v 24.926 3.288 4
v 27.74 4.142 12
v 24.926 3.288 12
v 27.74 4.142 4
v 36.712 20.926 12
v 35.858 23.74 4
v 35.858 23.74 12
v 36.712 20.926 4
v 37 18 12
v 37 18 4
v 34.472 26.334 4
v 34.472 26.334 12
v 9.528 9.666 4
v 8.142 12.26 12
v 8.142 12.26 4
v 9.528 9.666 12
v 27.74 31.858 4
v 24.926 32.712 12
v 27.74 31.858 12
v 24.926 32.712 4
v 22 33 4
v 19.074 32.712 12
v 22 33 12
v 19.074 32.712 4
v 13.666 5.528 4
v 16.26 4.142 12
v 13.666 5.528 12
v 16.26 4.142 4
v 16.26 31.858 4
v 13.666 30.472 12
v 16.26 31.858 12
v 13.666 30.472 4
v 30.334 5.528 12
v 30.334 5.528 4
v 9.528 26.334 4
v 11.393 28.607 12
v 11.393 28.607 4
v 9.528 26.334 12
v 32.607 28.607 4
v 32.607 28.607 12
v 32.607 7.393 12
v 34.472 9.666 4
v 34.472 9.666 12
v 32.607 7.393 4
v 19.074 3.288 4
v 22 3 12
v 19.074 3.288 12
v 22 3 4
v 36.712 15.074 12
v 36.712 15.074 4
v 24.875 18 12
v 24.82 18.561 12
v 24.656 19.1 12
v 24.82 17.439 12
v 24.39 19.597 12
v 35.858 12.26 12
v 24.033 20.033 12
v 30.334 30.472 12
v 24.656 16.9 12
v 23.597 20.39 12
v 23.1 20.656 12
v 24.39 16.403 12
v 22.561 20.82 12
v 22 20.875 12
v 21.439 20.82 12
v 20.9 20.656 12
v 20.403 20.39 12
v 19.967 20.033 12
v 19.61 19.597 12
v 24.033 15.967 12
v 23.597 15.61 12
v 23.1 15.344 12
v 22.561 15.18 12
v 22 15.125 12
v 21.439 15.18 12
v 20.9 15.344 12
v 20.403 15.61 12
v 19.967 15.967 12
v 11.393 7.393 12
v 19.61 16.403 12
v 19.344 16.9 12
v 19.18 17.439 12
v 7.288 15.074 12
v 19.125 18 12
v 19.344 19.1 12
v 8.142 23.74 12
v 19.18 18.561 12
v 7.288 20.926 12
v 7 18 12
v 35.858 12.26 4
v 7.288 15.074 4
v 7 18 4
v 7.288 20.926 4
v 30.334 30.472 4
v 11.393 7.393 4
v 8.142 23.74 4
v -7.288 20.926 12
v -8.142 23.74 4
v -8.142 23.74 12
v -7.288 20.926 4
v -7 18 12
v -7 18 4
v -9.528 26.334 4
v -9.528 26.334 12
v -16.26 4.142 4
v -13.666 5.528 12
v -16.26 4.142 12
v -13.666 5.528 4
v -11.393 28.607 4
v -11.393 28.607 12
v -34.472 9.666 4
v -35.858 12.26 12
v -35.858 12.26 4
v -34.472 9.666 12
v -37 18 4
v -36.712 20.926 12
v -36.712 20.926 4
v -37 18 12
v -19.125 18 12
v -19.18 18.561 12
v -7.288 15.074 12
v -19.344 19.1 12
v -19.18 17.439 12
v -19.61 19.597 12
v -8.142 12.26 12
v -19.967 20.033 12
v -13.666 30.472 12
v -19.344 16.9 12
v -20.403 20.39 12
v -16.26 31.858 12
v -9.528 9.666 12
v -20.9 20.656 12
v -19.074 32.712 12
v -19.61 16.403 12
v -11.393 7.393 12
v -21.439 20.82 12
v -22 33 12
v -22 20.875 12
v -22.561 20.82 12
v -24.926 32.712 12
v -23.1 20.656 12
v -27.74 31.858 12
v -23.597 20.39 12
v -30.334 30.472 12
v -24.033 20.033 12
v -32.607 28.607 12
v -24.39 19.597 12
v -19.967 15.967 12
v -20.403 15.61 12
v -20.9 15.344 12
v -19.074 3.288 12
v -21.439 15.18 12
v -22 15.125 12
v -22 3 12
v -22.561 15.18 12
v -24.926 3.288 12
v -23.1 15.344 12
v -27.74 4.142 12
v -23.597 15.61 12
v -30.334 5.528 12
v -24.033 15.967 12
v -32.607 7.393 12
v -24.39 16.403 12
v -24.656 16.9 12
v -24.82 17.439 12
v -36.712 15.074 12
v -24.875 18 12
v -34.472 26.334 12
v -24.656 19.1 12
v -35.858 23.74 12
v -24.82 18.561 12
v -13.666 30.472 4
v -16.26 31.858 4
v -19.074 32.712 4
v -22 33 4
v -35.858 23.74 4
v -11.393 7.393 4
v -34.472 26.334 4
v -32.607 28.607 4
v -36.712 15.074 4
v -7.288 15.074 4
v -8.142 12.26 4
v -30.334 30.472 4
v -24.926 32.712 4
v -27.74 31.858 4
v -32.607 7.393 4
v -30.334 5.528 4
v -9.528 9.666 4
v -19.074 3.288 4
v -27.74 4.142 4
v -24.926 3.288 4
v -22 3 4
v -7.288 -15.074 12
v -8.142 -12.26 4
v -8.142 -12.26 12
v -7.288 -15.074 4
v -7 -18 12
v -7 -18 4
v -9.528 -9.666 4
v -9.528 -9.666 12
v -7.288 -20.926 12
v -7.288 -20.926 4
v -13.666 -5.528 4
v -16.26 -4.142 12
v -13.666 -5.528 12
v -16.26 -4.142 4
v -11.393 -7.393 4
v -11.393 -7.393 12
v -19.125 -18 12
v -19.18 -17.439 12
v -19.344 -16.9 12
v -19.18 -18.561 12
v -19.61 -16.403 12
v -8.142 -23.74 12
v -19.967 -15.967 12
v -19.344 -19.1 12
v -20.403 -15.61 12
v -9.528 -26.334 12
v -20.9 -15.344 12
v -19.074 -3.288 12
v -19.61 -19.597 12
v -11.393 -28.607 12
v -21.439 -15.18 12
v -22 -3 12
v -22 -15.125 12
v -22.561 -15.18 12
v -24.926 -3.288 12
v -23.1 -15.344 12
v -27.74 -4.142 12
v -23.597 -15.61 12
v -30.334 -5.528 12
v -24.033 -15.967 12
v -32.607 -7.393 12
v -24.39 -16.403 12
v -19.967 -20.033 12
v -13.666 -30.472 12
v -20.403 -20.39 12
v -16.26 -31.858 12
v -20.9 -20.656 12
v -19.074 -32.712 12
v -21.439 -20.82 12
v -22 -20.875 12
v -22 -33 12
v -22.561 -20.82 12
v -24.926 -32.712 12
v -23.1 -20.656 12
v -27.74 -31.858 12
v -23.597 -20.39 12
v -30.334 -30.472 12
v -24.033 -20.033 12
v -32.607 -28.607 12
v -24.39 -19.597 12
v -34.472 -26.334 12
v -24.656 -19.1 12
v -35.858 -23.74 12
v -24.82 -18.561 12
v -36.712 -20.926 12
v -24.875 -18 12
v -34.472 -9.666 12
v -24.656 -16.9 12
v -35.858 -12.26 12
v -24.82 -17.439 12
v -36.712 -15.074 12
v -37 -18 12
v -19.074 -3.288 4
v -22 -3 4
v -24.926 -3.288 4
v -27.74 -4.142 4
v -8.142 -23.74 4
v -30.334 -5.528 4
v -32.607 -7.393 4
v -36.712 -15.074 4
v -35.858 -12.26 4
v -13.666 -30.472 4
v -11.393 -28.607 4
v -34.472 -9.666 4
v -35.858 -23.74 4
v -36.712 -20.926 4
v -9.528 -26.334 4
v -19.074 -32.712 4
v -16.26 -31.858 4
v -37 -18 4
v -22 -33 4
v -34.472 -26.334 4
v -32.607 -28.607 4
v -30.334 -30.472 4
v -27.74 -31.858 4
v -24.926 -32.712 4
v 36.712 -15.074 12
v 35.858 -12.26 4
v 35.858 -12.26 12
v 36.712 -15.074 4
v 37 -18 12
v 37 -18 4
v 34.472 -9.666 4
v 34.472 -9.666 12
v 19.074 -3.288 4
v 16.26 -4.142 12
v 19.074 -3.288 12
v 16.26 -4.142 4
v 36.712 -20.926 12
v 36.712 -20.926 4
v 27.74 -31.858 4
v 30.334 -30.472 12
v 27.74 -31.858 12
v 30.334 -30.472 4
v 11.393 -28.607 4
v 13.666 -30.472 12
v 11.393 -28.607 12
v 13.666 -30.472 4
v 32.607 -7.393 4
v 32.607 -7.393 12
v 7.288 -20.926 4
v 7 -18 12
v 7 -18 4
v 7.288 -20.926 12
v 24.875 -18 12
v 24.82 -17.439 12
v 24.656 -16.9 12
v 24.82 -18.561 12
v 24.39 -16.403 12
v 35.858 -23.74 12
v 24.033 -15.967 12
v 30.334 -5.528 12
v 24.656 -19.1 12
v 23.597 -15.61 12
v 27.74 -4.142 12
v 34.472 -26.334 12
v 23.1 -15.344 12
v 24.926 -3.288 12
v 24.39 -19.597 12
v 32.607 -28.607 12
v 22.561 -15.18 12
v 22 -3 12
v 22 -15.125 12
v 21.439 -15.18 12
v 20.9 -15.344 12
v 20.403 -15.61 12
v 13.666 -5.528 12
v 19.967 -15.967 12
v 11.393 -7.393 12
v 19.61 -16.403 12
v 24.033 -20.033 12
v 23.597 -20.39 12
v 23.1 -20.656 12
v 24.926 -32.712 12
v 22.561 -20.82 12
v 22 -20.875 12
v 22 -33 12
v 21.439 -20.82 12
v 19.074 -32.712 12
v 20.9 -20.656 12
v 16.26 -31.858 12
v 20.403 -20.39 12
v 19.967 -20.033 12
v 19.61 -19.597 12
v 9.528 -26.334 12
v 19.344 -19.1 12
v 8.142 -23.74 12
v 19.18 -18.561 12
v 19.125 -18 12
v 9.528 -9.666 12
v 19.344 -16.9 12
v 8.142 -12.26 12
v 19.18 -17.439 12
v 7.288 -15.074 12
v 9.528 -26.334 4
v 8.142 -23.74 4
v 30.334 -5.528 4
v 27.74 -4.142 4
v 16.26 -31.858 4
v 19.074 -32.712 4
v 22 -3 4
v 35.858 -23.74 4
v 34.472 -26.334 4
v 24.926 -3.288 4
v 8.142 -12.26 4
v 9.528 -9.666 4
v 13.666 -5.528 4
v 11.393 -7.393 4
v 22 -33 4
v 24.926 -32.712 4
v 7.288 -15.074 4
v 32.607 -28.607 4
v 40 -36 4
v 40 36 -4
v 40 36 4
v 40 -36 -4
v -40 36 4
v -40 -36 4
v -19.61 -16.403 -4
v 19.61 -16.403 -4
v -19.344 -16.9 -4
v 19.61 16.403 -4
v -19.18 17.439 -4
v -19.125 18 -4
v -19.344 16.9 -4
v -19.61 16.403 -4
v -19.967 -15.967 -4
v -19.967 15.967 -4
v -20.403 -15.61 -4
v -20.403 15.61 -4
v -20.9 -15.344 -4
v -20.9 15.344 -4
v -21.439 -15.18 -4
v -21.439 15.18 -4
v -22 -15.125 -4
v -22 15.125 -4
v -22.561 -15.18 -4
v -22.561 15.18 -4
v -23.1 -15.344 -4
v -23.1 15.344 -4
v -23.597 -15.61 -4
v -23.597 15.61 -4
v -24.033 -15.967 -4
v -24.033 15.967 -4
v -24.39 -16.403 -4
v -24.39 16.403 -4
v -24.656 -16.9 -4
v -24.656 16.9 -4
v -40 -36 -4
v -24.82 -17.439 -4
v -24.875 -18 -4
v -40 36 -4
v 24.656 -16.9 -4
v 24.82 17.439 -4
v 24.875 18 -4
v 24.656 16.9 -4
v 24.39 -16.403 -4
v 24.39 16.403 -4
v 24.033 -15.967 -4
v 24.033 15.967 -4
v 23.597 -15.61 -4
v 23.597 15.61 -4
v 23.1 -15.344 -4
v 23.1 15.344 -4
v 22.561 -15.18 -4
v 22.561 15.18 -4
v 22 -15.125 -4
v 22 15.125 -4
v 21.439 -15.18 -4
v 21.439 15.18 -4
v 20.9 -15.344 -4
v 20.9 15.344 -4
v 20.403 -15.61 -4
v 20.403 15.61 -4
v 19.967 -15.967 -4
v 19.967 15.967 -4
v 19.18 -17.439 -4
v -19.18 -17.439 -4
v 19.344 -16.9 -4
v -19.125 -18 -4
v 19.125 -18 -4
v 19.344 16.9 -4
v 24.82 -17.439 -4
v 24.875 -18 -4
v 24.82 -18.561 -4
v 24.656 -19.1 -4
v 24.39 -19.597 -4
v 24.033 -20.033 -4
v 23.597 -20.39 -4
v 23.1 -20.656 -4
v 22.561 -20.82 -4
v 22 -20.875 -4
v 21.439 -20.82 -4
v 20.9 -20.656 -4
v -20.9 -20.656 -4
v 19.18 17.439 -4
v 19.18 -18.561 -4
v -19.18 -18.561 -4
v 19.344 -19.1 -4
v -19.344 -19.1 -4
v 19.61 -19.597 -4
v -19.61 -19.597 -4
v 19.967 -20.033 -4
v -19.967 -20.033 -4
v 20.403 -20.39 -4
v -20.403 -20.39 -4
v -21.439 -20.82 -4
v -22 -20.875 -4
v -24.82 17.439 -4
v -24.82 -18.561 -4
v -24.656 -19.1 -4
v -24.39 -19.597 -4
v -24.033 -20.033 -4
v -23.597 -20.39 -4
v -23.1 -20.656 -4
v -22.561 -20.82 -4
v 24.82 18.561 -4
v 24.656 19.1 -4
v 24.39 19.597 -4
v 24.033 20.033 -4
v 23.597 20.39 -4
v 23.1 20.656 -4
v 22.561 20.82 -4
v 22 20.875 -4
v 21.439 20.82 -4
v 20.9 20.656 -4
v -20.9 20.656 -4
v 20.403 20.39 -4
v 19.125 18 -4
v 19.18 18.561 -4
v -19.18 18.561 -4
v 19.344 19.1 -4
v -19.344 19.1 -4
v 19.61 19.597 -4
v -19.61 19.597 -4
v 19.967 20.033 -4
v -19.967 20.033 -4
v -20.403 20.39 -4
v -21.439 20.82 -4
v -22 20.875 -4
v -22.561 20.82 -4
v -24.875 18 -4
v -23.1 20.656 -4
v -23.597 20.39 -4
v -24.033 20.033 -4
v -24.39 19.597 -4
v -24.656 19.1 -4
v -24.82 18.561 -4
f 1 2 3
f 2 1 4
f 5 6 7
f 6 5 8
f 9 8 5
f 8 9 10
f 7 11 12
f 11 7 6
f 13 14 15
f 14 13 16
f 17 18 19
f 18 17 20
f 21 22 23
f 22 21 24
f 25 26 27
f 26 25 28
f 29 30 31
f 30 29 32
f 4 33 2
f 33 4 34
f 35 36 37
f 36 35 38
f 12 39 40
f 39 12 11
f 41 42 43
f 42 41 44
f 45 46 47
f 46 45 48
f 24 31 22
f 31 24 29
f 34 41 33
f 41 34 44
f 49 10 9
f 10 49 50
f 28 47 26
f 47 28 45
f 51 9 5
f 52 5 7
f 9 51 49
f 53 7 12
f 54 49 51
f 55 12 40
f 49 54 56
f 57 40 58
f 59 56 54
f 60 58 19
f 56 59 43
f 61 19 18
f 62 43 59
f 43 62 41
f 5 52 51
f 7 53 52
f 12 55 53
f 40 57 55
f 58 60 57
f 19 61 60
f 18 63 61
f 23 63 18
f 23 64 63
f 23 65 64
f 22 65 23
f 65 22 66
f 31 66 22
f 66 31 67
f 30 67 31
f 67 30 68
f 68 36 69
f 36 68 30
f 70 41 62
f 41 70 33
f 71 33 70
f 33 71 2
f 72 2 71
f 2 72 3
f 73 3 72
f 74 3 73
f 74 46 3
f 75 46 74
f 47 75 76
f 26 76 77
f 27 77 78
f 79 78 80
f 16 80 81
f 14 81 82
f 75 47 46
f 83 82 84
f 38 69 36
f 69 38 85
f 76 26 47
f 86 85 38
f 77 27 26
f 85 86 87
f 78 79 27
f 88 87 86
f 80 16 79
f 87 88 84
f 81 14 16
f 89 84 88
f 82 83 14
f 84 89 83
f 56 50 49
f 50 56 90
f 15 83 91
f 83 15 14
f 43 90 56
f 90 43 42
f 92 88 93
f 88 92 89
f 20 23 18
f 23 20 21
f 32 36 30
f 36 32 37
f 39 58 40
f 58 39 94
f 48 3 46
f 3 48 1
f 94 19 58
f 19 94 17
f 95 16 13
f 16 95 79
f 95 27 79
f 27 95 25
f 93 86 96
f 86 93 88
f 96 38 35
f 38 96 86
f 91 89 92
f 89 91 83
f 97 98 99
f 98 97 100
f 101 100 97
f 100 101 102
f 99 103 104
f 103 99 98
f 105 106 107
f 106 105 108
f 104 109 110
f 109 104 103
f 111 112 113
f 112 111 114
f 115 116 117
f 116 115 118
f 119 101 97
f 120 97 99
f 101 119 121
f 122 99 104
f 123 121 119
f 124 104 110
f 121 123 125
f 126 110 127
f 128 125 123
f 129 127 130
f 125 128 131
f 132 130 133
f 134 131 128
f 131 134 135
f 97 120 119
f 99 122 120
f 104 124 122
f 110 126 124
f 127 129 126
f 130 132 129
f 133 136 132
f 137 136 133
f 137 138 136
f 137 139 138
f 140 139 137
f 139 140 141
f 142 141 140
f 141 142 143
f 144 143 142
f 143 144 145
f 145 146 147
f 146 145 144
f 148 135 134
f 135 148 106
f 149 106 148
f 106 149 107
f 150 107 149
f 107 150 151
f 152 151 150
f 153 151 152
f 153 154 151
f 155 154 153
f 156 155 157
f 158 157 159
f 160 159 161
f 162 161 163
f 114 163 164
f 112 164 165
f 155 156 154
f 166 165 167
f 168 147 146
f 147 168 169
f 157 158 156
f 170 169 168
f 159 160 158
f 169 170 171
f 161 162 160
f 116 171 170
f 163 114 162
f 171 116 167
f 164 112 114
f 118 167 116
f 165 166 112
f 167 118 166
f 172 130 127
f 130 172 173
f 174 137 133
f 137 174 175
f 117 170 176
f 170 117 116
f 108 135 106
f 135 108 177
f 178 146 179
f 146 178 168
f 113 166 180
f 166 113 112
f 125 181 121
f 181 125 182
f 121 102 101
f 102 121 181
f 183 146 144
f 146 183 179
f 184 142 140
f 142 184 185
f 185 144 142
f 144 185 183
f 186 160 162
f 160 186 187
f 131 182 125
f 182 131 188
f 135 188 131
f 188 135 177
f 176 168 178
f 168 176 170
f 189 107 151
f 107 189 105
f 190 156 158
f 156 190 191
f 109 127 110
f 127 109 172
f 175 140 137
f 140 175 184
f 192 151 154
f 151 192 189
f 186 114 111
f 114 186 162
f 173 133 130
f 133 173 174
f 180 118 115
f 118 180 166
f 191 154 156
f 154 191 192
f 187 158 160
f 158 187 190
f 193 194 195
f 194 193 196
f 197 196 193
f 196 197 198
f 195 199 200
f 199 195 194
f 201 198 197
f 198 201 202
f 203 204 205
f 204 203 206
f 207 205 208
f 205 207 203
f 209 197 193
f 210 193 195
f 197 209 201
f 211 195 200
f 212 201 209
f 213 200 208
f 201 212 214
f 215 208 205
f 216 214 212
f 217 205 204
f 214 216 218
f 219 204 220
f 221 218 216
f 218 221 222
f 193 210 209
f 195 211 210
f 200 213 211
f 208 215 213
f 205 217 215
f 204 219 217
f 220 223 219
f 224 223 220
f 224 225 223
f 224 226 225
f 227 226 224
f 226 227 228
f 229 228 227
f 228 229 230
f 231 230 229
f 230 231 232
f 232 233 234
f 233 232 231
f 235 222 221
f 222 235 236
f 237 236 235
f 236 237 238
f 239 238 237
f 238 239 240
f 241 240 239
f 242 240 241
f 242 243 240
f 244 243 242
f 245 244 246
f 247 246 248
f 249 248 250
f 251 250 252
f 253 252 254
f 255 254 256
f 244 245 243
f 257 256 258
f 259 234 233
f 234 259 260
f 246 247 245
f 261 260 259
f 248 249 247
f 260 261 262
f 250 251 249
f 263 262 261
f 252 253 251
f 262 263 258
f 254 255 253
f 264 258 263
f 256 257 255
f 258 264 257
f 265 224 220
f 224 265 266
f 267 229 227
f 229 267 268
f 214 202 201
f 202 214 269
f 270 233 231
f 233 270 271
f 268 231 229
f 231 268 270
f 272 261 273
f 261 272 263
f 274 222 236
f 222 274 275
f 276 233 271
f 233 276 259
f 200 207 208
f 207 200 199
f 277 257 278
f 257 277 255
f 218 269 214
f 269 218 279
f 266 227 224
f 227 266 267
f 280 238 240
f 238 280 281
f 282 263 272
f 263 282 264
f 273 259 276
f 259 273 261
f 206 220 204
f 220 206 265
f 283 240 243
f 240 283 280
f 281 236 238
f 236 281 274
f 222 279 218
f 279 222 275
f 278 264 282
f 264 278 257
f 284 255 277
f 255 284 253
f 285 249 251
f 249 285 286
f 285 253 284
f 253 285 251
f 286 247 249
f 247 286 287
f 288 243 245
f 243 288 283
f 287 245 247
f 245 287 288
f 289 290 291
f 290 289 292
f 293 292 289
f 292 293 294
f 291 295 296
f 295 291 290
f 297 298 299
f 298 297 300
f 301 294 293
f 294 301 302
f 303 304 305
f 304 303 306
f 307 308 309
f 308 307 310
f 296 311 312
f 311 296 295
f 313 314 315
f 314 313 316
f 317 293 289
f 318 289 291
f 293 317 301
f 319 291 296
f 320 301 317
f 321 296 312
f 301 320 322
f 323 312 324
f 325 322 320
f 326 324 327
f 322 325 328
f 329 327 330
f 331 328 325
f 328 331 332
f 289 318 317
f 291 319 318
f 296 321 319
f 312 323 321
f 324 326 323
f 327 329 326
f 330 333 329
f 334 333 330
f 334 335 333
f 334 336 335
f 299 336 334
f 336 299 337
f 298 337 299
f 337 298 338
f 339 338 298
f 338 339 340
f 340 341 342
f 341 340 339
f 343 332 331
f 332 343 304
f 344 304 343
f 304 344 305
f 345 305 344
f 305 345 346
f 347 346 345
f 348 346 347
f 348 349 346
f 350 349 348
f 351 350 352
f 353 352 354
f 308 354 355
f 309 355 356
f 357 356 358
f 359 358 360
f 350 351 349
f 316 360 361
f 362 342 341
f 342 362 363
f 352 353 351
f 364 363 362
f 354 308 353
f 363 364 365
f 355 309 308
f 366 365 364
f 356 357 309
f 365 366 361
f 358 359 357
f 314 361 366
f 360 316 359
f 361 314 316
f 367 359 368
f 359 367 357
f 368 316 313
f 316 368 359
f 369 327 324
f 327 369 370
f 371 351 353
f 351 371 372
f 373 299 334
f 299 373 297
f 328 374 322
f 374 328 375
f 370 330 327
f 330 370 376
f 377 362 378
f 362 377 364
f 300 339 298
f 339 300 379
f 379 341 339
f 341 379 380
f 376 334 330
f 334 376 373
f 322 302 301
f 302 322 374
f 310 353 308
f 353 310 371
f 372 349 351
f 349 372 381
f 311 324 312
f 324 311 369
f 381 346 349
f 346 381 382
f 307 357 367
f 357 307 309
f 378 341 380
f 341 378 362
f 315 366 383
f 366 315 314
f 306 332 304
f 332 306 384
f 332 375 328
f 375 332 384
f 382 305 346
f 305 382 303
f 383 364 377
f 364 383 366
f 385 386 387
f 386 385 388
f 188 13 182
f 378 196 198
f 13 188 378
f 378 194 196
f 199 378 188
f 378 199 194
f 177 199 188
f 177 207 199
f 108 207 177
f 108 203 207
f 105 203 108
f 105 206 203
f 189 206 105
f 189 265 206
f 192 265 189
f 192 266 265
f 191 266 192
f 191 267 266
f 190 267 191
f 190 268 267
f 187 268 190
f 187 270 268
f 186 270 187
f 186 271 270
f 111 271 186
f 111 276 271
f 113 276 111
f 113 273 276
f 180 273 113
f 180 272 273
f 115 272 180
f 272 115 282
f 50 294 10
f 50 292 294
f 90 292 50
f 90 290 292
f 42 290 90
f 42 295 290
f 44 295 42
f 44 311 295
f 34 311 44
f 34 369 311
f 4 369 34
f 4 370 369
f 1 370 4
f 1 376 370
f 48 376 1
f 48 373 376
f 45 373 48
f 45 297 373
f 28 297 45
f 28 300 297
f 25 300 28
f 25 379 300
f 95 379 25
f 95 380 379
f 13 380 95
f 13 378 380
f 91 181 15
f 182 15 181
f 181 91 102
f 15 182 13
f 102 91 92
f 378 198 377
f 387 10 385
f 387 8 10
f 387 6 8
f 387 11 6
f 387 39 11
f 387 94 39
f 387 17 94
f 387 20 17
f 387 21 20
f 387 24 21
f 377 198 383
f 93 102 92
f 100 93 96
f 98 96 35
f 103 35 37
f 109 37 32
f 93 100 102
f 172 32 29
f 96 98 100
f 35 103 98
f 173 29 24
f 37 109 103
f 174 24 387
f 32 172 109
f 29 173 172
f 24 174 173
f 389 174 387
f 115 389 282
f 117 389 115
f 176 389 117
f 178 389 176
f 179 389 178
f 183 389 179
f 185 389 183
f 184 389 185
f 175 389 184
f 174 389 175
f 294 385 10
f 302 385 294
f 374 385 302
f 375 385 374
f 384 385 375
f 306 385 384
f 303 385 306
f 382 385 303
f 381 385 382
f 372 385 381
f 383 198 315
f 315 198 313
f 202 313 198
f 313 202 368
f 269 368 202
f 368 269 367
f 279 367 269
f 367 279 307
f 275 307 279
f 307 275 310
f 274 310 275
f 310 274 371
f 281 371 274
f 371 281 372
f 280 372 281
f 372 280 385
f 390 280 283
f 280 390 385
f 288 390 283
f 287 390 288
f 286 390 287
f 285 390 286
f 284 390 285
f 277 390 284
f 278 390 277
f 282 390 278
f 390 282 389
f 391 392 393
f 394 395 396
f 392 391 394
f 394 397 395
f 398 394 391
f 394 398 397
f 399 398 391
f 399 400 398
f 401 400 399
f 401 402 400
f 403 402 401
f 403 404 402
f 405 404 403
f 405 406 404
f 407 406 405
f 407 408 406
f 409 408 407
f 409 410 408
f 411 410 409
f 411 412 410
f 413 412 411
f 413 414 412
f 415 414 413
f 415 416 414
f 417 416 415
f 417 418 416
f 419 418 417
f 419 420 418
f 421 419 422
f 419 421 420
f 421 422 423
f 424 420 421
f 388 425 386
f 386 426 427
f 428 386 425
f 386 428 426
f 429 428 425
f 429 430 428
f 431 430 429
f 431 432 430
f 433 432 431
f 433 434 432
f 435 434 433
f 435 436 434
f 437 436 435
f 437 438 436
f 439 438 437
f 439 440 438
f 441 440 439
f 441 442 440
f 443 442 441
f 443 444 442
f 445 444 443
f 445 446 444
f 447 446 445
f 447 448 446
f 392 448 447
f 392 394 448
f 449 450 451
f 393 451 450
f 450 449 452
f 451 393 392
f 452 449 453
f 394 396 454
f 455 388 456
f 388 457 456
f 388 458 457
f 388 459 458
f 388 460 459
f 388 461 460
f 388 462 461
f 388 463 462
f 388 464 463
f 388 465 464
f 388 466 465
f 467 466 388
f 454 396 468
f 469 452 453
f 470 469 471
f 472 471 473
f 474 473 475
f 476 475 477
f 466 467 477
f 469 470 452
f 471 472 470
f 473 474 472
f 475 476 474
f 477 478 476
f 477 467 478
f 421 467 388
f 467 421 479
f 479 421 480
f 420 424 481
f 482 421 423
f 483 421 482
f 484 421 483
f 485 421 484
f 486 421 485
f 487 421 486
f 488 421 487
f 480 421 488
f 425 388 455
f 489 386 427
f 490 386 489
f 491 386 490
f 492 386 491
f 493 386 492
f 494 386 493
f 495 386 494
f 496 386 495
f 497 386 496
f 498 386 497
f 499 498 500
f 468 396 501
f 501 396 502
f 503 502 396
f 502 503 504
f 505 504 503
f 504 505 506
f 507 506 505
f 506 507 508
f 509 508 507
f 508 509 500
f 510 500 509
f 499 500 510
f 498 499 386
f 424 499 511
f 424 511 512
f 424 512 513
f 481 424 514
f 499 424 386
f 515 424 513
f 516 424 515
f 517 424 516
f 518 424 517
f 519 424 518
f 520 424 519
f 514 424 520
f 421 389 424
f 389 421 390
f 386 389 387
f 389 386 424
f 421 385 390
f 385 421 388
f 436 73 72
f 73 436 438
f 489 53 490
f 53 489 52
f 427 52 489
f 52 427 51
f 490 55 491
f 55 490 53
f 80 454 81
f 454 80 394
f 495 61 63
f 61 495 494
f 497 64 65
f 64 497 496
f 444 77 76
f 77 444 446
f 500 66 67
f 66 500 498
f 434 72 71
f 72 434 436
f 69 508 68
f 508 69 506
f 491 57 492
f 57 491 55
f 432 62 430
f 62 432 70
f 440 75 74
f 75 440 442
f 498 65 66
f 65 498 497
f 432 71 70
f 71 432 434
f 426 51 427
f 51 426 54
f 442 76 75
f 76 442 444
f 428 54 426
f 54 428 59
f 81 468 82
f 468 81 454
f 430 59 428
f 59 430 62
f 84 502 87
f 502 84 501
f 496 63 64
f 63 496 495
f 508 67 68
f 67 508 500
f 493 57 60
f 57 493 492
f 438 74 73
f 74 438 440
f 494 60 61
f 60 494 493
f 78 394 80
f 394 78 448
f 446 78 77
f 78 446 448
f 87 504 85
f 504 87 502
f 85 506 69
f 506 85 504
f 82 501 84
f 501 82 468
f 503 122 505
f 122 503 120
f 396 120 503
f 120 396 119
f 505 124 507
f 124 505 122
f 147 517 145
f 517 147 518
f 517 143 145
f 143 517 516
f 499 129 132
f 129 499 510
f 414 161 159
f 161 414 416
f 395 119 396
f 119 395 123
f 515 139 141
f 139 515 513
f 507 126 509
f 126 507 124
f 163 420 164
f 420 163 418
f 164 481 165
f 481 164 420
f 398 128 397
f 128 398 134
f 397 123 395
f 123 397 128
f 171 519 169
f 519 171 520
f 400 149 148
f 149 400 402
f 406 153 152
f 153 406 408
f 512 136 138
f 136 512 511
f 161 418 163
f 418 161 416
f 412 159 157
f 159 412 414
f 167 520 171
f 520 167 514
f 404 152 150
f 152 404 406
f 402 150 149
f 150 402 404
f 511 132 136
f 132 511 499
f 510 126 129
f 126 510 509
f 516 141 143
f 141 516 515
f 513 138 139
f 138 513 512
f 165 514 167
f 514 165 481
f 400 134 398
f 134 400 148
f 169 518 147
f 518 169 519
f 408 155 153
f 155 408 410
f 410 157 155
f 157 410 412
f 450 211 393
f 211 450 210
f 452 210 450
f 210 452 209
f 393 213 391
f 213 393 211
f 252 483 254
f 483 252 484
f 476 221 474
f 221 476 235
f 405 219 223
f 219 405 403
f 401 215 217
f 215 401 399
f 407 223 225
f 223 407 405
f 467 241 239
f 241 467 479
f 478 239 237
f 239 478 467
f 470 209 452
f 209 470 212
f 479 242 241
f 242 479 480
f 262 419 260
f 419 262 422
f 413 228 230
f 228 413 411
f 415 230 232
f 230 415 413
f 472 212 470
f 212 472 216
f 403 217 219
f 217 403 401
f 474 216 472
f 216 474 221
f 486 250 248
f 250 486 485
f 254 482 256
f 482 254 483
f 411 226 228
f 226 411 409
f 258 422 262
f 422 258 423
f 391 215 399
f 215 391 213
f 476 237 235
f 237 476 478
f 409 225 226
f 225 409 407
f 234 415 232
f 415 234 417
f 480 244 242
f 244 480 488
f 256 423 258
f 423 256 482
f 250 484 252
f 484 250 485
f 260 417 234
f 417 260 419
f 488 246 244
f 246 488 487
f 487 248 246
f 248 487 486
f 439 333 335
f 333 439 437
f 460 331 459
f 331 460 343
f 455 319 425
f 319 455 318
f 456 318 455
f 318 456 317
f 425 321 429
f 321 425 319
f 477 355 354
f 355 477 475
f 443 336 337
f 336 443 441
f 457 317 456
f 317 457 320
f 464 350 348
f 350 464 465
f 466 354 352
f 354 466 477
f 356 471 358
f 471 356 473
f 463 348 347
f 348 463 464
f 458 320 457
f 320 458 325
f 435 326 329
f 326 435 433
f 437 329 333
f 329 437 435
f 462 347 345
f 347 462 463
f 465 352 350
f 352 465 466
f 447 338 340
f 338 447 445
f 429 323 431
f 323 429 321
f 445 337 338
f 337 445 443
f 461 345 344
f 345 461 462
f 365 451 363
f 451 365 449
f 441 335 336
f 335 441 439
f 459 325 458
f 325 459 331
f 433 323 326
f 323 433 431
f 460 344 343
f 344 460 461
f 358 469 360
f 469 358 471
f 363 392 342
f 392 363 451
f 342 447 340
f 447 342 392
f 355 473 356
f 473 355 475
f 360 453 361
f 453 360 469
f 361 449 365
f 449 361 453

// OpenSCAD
$fn = 32;

// ----------------------------------------------------------------------
// Anchor pads 80 x 72 x 16
// four corner bosses with anchor holes
// ----------------------------------------------------------------------

// --- parameters (mm) ---
plate = [80, 72, 8];     // base plate size (x, y, z)
pads = 4;                // boss count, one per corner
edge = 18;               // boss centre offset from the plate edge
boss_d = 30;             // boss diameter
boss_h = 8;              // boss height above the base plate
bore_d = 5.5;            // nominal hole diameter from the drawing
print_allowance = 0.25;  // clearance added for printing

// --- derived feature positions (mm) ---
hole_d = bore_d + print_allowance;  // = 5.75   hole diameter as printed
height = plate[2] + boss_h;         // = 16   overall height of the part
corner_x = plate[0] / 2 - edge;     // = 22   boss centre X
corner_y = plate[1] / 2 - edge;     // = 18   boss centre Y
feature_centers = [
  [corner_x, corner_y],
  [-corner_x, corner_y],
  [-corner_x, -corner_y],
  [corner_x, -corner_y]
];   // boss centres, anchor holes are drilled there

// base plate, four bosses standing on it, anchor holes all the way through
difference() {
  union() {
    cube(plate, center = true);
    for (centre = feature_centers)
      translate([centre[0], centre[1], plate[2] / 2 - 1])
        cylinder(d = boss_d, h = boss_h + 1);
  }
  for (centre = feature_centers)
    translate([centre[0], centre[1], -height])
      cylinder(d = hole_d, h = 2 * height + 2);  // through boss and plate
}
